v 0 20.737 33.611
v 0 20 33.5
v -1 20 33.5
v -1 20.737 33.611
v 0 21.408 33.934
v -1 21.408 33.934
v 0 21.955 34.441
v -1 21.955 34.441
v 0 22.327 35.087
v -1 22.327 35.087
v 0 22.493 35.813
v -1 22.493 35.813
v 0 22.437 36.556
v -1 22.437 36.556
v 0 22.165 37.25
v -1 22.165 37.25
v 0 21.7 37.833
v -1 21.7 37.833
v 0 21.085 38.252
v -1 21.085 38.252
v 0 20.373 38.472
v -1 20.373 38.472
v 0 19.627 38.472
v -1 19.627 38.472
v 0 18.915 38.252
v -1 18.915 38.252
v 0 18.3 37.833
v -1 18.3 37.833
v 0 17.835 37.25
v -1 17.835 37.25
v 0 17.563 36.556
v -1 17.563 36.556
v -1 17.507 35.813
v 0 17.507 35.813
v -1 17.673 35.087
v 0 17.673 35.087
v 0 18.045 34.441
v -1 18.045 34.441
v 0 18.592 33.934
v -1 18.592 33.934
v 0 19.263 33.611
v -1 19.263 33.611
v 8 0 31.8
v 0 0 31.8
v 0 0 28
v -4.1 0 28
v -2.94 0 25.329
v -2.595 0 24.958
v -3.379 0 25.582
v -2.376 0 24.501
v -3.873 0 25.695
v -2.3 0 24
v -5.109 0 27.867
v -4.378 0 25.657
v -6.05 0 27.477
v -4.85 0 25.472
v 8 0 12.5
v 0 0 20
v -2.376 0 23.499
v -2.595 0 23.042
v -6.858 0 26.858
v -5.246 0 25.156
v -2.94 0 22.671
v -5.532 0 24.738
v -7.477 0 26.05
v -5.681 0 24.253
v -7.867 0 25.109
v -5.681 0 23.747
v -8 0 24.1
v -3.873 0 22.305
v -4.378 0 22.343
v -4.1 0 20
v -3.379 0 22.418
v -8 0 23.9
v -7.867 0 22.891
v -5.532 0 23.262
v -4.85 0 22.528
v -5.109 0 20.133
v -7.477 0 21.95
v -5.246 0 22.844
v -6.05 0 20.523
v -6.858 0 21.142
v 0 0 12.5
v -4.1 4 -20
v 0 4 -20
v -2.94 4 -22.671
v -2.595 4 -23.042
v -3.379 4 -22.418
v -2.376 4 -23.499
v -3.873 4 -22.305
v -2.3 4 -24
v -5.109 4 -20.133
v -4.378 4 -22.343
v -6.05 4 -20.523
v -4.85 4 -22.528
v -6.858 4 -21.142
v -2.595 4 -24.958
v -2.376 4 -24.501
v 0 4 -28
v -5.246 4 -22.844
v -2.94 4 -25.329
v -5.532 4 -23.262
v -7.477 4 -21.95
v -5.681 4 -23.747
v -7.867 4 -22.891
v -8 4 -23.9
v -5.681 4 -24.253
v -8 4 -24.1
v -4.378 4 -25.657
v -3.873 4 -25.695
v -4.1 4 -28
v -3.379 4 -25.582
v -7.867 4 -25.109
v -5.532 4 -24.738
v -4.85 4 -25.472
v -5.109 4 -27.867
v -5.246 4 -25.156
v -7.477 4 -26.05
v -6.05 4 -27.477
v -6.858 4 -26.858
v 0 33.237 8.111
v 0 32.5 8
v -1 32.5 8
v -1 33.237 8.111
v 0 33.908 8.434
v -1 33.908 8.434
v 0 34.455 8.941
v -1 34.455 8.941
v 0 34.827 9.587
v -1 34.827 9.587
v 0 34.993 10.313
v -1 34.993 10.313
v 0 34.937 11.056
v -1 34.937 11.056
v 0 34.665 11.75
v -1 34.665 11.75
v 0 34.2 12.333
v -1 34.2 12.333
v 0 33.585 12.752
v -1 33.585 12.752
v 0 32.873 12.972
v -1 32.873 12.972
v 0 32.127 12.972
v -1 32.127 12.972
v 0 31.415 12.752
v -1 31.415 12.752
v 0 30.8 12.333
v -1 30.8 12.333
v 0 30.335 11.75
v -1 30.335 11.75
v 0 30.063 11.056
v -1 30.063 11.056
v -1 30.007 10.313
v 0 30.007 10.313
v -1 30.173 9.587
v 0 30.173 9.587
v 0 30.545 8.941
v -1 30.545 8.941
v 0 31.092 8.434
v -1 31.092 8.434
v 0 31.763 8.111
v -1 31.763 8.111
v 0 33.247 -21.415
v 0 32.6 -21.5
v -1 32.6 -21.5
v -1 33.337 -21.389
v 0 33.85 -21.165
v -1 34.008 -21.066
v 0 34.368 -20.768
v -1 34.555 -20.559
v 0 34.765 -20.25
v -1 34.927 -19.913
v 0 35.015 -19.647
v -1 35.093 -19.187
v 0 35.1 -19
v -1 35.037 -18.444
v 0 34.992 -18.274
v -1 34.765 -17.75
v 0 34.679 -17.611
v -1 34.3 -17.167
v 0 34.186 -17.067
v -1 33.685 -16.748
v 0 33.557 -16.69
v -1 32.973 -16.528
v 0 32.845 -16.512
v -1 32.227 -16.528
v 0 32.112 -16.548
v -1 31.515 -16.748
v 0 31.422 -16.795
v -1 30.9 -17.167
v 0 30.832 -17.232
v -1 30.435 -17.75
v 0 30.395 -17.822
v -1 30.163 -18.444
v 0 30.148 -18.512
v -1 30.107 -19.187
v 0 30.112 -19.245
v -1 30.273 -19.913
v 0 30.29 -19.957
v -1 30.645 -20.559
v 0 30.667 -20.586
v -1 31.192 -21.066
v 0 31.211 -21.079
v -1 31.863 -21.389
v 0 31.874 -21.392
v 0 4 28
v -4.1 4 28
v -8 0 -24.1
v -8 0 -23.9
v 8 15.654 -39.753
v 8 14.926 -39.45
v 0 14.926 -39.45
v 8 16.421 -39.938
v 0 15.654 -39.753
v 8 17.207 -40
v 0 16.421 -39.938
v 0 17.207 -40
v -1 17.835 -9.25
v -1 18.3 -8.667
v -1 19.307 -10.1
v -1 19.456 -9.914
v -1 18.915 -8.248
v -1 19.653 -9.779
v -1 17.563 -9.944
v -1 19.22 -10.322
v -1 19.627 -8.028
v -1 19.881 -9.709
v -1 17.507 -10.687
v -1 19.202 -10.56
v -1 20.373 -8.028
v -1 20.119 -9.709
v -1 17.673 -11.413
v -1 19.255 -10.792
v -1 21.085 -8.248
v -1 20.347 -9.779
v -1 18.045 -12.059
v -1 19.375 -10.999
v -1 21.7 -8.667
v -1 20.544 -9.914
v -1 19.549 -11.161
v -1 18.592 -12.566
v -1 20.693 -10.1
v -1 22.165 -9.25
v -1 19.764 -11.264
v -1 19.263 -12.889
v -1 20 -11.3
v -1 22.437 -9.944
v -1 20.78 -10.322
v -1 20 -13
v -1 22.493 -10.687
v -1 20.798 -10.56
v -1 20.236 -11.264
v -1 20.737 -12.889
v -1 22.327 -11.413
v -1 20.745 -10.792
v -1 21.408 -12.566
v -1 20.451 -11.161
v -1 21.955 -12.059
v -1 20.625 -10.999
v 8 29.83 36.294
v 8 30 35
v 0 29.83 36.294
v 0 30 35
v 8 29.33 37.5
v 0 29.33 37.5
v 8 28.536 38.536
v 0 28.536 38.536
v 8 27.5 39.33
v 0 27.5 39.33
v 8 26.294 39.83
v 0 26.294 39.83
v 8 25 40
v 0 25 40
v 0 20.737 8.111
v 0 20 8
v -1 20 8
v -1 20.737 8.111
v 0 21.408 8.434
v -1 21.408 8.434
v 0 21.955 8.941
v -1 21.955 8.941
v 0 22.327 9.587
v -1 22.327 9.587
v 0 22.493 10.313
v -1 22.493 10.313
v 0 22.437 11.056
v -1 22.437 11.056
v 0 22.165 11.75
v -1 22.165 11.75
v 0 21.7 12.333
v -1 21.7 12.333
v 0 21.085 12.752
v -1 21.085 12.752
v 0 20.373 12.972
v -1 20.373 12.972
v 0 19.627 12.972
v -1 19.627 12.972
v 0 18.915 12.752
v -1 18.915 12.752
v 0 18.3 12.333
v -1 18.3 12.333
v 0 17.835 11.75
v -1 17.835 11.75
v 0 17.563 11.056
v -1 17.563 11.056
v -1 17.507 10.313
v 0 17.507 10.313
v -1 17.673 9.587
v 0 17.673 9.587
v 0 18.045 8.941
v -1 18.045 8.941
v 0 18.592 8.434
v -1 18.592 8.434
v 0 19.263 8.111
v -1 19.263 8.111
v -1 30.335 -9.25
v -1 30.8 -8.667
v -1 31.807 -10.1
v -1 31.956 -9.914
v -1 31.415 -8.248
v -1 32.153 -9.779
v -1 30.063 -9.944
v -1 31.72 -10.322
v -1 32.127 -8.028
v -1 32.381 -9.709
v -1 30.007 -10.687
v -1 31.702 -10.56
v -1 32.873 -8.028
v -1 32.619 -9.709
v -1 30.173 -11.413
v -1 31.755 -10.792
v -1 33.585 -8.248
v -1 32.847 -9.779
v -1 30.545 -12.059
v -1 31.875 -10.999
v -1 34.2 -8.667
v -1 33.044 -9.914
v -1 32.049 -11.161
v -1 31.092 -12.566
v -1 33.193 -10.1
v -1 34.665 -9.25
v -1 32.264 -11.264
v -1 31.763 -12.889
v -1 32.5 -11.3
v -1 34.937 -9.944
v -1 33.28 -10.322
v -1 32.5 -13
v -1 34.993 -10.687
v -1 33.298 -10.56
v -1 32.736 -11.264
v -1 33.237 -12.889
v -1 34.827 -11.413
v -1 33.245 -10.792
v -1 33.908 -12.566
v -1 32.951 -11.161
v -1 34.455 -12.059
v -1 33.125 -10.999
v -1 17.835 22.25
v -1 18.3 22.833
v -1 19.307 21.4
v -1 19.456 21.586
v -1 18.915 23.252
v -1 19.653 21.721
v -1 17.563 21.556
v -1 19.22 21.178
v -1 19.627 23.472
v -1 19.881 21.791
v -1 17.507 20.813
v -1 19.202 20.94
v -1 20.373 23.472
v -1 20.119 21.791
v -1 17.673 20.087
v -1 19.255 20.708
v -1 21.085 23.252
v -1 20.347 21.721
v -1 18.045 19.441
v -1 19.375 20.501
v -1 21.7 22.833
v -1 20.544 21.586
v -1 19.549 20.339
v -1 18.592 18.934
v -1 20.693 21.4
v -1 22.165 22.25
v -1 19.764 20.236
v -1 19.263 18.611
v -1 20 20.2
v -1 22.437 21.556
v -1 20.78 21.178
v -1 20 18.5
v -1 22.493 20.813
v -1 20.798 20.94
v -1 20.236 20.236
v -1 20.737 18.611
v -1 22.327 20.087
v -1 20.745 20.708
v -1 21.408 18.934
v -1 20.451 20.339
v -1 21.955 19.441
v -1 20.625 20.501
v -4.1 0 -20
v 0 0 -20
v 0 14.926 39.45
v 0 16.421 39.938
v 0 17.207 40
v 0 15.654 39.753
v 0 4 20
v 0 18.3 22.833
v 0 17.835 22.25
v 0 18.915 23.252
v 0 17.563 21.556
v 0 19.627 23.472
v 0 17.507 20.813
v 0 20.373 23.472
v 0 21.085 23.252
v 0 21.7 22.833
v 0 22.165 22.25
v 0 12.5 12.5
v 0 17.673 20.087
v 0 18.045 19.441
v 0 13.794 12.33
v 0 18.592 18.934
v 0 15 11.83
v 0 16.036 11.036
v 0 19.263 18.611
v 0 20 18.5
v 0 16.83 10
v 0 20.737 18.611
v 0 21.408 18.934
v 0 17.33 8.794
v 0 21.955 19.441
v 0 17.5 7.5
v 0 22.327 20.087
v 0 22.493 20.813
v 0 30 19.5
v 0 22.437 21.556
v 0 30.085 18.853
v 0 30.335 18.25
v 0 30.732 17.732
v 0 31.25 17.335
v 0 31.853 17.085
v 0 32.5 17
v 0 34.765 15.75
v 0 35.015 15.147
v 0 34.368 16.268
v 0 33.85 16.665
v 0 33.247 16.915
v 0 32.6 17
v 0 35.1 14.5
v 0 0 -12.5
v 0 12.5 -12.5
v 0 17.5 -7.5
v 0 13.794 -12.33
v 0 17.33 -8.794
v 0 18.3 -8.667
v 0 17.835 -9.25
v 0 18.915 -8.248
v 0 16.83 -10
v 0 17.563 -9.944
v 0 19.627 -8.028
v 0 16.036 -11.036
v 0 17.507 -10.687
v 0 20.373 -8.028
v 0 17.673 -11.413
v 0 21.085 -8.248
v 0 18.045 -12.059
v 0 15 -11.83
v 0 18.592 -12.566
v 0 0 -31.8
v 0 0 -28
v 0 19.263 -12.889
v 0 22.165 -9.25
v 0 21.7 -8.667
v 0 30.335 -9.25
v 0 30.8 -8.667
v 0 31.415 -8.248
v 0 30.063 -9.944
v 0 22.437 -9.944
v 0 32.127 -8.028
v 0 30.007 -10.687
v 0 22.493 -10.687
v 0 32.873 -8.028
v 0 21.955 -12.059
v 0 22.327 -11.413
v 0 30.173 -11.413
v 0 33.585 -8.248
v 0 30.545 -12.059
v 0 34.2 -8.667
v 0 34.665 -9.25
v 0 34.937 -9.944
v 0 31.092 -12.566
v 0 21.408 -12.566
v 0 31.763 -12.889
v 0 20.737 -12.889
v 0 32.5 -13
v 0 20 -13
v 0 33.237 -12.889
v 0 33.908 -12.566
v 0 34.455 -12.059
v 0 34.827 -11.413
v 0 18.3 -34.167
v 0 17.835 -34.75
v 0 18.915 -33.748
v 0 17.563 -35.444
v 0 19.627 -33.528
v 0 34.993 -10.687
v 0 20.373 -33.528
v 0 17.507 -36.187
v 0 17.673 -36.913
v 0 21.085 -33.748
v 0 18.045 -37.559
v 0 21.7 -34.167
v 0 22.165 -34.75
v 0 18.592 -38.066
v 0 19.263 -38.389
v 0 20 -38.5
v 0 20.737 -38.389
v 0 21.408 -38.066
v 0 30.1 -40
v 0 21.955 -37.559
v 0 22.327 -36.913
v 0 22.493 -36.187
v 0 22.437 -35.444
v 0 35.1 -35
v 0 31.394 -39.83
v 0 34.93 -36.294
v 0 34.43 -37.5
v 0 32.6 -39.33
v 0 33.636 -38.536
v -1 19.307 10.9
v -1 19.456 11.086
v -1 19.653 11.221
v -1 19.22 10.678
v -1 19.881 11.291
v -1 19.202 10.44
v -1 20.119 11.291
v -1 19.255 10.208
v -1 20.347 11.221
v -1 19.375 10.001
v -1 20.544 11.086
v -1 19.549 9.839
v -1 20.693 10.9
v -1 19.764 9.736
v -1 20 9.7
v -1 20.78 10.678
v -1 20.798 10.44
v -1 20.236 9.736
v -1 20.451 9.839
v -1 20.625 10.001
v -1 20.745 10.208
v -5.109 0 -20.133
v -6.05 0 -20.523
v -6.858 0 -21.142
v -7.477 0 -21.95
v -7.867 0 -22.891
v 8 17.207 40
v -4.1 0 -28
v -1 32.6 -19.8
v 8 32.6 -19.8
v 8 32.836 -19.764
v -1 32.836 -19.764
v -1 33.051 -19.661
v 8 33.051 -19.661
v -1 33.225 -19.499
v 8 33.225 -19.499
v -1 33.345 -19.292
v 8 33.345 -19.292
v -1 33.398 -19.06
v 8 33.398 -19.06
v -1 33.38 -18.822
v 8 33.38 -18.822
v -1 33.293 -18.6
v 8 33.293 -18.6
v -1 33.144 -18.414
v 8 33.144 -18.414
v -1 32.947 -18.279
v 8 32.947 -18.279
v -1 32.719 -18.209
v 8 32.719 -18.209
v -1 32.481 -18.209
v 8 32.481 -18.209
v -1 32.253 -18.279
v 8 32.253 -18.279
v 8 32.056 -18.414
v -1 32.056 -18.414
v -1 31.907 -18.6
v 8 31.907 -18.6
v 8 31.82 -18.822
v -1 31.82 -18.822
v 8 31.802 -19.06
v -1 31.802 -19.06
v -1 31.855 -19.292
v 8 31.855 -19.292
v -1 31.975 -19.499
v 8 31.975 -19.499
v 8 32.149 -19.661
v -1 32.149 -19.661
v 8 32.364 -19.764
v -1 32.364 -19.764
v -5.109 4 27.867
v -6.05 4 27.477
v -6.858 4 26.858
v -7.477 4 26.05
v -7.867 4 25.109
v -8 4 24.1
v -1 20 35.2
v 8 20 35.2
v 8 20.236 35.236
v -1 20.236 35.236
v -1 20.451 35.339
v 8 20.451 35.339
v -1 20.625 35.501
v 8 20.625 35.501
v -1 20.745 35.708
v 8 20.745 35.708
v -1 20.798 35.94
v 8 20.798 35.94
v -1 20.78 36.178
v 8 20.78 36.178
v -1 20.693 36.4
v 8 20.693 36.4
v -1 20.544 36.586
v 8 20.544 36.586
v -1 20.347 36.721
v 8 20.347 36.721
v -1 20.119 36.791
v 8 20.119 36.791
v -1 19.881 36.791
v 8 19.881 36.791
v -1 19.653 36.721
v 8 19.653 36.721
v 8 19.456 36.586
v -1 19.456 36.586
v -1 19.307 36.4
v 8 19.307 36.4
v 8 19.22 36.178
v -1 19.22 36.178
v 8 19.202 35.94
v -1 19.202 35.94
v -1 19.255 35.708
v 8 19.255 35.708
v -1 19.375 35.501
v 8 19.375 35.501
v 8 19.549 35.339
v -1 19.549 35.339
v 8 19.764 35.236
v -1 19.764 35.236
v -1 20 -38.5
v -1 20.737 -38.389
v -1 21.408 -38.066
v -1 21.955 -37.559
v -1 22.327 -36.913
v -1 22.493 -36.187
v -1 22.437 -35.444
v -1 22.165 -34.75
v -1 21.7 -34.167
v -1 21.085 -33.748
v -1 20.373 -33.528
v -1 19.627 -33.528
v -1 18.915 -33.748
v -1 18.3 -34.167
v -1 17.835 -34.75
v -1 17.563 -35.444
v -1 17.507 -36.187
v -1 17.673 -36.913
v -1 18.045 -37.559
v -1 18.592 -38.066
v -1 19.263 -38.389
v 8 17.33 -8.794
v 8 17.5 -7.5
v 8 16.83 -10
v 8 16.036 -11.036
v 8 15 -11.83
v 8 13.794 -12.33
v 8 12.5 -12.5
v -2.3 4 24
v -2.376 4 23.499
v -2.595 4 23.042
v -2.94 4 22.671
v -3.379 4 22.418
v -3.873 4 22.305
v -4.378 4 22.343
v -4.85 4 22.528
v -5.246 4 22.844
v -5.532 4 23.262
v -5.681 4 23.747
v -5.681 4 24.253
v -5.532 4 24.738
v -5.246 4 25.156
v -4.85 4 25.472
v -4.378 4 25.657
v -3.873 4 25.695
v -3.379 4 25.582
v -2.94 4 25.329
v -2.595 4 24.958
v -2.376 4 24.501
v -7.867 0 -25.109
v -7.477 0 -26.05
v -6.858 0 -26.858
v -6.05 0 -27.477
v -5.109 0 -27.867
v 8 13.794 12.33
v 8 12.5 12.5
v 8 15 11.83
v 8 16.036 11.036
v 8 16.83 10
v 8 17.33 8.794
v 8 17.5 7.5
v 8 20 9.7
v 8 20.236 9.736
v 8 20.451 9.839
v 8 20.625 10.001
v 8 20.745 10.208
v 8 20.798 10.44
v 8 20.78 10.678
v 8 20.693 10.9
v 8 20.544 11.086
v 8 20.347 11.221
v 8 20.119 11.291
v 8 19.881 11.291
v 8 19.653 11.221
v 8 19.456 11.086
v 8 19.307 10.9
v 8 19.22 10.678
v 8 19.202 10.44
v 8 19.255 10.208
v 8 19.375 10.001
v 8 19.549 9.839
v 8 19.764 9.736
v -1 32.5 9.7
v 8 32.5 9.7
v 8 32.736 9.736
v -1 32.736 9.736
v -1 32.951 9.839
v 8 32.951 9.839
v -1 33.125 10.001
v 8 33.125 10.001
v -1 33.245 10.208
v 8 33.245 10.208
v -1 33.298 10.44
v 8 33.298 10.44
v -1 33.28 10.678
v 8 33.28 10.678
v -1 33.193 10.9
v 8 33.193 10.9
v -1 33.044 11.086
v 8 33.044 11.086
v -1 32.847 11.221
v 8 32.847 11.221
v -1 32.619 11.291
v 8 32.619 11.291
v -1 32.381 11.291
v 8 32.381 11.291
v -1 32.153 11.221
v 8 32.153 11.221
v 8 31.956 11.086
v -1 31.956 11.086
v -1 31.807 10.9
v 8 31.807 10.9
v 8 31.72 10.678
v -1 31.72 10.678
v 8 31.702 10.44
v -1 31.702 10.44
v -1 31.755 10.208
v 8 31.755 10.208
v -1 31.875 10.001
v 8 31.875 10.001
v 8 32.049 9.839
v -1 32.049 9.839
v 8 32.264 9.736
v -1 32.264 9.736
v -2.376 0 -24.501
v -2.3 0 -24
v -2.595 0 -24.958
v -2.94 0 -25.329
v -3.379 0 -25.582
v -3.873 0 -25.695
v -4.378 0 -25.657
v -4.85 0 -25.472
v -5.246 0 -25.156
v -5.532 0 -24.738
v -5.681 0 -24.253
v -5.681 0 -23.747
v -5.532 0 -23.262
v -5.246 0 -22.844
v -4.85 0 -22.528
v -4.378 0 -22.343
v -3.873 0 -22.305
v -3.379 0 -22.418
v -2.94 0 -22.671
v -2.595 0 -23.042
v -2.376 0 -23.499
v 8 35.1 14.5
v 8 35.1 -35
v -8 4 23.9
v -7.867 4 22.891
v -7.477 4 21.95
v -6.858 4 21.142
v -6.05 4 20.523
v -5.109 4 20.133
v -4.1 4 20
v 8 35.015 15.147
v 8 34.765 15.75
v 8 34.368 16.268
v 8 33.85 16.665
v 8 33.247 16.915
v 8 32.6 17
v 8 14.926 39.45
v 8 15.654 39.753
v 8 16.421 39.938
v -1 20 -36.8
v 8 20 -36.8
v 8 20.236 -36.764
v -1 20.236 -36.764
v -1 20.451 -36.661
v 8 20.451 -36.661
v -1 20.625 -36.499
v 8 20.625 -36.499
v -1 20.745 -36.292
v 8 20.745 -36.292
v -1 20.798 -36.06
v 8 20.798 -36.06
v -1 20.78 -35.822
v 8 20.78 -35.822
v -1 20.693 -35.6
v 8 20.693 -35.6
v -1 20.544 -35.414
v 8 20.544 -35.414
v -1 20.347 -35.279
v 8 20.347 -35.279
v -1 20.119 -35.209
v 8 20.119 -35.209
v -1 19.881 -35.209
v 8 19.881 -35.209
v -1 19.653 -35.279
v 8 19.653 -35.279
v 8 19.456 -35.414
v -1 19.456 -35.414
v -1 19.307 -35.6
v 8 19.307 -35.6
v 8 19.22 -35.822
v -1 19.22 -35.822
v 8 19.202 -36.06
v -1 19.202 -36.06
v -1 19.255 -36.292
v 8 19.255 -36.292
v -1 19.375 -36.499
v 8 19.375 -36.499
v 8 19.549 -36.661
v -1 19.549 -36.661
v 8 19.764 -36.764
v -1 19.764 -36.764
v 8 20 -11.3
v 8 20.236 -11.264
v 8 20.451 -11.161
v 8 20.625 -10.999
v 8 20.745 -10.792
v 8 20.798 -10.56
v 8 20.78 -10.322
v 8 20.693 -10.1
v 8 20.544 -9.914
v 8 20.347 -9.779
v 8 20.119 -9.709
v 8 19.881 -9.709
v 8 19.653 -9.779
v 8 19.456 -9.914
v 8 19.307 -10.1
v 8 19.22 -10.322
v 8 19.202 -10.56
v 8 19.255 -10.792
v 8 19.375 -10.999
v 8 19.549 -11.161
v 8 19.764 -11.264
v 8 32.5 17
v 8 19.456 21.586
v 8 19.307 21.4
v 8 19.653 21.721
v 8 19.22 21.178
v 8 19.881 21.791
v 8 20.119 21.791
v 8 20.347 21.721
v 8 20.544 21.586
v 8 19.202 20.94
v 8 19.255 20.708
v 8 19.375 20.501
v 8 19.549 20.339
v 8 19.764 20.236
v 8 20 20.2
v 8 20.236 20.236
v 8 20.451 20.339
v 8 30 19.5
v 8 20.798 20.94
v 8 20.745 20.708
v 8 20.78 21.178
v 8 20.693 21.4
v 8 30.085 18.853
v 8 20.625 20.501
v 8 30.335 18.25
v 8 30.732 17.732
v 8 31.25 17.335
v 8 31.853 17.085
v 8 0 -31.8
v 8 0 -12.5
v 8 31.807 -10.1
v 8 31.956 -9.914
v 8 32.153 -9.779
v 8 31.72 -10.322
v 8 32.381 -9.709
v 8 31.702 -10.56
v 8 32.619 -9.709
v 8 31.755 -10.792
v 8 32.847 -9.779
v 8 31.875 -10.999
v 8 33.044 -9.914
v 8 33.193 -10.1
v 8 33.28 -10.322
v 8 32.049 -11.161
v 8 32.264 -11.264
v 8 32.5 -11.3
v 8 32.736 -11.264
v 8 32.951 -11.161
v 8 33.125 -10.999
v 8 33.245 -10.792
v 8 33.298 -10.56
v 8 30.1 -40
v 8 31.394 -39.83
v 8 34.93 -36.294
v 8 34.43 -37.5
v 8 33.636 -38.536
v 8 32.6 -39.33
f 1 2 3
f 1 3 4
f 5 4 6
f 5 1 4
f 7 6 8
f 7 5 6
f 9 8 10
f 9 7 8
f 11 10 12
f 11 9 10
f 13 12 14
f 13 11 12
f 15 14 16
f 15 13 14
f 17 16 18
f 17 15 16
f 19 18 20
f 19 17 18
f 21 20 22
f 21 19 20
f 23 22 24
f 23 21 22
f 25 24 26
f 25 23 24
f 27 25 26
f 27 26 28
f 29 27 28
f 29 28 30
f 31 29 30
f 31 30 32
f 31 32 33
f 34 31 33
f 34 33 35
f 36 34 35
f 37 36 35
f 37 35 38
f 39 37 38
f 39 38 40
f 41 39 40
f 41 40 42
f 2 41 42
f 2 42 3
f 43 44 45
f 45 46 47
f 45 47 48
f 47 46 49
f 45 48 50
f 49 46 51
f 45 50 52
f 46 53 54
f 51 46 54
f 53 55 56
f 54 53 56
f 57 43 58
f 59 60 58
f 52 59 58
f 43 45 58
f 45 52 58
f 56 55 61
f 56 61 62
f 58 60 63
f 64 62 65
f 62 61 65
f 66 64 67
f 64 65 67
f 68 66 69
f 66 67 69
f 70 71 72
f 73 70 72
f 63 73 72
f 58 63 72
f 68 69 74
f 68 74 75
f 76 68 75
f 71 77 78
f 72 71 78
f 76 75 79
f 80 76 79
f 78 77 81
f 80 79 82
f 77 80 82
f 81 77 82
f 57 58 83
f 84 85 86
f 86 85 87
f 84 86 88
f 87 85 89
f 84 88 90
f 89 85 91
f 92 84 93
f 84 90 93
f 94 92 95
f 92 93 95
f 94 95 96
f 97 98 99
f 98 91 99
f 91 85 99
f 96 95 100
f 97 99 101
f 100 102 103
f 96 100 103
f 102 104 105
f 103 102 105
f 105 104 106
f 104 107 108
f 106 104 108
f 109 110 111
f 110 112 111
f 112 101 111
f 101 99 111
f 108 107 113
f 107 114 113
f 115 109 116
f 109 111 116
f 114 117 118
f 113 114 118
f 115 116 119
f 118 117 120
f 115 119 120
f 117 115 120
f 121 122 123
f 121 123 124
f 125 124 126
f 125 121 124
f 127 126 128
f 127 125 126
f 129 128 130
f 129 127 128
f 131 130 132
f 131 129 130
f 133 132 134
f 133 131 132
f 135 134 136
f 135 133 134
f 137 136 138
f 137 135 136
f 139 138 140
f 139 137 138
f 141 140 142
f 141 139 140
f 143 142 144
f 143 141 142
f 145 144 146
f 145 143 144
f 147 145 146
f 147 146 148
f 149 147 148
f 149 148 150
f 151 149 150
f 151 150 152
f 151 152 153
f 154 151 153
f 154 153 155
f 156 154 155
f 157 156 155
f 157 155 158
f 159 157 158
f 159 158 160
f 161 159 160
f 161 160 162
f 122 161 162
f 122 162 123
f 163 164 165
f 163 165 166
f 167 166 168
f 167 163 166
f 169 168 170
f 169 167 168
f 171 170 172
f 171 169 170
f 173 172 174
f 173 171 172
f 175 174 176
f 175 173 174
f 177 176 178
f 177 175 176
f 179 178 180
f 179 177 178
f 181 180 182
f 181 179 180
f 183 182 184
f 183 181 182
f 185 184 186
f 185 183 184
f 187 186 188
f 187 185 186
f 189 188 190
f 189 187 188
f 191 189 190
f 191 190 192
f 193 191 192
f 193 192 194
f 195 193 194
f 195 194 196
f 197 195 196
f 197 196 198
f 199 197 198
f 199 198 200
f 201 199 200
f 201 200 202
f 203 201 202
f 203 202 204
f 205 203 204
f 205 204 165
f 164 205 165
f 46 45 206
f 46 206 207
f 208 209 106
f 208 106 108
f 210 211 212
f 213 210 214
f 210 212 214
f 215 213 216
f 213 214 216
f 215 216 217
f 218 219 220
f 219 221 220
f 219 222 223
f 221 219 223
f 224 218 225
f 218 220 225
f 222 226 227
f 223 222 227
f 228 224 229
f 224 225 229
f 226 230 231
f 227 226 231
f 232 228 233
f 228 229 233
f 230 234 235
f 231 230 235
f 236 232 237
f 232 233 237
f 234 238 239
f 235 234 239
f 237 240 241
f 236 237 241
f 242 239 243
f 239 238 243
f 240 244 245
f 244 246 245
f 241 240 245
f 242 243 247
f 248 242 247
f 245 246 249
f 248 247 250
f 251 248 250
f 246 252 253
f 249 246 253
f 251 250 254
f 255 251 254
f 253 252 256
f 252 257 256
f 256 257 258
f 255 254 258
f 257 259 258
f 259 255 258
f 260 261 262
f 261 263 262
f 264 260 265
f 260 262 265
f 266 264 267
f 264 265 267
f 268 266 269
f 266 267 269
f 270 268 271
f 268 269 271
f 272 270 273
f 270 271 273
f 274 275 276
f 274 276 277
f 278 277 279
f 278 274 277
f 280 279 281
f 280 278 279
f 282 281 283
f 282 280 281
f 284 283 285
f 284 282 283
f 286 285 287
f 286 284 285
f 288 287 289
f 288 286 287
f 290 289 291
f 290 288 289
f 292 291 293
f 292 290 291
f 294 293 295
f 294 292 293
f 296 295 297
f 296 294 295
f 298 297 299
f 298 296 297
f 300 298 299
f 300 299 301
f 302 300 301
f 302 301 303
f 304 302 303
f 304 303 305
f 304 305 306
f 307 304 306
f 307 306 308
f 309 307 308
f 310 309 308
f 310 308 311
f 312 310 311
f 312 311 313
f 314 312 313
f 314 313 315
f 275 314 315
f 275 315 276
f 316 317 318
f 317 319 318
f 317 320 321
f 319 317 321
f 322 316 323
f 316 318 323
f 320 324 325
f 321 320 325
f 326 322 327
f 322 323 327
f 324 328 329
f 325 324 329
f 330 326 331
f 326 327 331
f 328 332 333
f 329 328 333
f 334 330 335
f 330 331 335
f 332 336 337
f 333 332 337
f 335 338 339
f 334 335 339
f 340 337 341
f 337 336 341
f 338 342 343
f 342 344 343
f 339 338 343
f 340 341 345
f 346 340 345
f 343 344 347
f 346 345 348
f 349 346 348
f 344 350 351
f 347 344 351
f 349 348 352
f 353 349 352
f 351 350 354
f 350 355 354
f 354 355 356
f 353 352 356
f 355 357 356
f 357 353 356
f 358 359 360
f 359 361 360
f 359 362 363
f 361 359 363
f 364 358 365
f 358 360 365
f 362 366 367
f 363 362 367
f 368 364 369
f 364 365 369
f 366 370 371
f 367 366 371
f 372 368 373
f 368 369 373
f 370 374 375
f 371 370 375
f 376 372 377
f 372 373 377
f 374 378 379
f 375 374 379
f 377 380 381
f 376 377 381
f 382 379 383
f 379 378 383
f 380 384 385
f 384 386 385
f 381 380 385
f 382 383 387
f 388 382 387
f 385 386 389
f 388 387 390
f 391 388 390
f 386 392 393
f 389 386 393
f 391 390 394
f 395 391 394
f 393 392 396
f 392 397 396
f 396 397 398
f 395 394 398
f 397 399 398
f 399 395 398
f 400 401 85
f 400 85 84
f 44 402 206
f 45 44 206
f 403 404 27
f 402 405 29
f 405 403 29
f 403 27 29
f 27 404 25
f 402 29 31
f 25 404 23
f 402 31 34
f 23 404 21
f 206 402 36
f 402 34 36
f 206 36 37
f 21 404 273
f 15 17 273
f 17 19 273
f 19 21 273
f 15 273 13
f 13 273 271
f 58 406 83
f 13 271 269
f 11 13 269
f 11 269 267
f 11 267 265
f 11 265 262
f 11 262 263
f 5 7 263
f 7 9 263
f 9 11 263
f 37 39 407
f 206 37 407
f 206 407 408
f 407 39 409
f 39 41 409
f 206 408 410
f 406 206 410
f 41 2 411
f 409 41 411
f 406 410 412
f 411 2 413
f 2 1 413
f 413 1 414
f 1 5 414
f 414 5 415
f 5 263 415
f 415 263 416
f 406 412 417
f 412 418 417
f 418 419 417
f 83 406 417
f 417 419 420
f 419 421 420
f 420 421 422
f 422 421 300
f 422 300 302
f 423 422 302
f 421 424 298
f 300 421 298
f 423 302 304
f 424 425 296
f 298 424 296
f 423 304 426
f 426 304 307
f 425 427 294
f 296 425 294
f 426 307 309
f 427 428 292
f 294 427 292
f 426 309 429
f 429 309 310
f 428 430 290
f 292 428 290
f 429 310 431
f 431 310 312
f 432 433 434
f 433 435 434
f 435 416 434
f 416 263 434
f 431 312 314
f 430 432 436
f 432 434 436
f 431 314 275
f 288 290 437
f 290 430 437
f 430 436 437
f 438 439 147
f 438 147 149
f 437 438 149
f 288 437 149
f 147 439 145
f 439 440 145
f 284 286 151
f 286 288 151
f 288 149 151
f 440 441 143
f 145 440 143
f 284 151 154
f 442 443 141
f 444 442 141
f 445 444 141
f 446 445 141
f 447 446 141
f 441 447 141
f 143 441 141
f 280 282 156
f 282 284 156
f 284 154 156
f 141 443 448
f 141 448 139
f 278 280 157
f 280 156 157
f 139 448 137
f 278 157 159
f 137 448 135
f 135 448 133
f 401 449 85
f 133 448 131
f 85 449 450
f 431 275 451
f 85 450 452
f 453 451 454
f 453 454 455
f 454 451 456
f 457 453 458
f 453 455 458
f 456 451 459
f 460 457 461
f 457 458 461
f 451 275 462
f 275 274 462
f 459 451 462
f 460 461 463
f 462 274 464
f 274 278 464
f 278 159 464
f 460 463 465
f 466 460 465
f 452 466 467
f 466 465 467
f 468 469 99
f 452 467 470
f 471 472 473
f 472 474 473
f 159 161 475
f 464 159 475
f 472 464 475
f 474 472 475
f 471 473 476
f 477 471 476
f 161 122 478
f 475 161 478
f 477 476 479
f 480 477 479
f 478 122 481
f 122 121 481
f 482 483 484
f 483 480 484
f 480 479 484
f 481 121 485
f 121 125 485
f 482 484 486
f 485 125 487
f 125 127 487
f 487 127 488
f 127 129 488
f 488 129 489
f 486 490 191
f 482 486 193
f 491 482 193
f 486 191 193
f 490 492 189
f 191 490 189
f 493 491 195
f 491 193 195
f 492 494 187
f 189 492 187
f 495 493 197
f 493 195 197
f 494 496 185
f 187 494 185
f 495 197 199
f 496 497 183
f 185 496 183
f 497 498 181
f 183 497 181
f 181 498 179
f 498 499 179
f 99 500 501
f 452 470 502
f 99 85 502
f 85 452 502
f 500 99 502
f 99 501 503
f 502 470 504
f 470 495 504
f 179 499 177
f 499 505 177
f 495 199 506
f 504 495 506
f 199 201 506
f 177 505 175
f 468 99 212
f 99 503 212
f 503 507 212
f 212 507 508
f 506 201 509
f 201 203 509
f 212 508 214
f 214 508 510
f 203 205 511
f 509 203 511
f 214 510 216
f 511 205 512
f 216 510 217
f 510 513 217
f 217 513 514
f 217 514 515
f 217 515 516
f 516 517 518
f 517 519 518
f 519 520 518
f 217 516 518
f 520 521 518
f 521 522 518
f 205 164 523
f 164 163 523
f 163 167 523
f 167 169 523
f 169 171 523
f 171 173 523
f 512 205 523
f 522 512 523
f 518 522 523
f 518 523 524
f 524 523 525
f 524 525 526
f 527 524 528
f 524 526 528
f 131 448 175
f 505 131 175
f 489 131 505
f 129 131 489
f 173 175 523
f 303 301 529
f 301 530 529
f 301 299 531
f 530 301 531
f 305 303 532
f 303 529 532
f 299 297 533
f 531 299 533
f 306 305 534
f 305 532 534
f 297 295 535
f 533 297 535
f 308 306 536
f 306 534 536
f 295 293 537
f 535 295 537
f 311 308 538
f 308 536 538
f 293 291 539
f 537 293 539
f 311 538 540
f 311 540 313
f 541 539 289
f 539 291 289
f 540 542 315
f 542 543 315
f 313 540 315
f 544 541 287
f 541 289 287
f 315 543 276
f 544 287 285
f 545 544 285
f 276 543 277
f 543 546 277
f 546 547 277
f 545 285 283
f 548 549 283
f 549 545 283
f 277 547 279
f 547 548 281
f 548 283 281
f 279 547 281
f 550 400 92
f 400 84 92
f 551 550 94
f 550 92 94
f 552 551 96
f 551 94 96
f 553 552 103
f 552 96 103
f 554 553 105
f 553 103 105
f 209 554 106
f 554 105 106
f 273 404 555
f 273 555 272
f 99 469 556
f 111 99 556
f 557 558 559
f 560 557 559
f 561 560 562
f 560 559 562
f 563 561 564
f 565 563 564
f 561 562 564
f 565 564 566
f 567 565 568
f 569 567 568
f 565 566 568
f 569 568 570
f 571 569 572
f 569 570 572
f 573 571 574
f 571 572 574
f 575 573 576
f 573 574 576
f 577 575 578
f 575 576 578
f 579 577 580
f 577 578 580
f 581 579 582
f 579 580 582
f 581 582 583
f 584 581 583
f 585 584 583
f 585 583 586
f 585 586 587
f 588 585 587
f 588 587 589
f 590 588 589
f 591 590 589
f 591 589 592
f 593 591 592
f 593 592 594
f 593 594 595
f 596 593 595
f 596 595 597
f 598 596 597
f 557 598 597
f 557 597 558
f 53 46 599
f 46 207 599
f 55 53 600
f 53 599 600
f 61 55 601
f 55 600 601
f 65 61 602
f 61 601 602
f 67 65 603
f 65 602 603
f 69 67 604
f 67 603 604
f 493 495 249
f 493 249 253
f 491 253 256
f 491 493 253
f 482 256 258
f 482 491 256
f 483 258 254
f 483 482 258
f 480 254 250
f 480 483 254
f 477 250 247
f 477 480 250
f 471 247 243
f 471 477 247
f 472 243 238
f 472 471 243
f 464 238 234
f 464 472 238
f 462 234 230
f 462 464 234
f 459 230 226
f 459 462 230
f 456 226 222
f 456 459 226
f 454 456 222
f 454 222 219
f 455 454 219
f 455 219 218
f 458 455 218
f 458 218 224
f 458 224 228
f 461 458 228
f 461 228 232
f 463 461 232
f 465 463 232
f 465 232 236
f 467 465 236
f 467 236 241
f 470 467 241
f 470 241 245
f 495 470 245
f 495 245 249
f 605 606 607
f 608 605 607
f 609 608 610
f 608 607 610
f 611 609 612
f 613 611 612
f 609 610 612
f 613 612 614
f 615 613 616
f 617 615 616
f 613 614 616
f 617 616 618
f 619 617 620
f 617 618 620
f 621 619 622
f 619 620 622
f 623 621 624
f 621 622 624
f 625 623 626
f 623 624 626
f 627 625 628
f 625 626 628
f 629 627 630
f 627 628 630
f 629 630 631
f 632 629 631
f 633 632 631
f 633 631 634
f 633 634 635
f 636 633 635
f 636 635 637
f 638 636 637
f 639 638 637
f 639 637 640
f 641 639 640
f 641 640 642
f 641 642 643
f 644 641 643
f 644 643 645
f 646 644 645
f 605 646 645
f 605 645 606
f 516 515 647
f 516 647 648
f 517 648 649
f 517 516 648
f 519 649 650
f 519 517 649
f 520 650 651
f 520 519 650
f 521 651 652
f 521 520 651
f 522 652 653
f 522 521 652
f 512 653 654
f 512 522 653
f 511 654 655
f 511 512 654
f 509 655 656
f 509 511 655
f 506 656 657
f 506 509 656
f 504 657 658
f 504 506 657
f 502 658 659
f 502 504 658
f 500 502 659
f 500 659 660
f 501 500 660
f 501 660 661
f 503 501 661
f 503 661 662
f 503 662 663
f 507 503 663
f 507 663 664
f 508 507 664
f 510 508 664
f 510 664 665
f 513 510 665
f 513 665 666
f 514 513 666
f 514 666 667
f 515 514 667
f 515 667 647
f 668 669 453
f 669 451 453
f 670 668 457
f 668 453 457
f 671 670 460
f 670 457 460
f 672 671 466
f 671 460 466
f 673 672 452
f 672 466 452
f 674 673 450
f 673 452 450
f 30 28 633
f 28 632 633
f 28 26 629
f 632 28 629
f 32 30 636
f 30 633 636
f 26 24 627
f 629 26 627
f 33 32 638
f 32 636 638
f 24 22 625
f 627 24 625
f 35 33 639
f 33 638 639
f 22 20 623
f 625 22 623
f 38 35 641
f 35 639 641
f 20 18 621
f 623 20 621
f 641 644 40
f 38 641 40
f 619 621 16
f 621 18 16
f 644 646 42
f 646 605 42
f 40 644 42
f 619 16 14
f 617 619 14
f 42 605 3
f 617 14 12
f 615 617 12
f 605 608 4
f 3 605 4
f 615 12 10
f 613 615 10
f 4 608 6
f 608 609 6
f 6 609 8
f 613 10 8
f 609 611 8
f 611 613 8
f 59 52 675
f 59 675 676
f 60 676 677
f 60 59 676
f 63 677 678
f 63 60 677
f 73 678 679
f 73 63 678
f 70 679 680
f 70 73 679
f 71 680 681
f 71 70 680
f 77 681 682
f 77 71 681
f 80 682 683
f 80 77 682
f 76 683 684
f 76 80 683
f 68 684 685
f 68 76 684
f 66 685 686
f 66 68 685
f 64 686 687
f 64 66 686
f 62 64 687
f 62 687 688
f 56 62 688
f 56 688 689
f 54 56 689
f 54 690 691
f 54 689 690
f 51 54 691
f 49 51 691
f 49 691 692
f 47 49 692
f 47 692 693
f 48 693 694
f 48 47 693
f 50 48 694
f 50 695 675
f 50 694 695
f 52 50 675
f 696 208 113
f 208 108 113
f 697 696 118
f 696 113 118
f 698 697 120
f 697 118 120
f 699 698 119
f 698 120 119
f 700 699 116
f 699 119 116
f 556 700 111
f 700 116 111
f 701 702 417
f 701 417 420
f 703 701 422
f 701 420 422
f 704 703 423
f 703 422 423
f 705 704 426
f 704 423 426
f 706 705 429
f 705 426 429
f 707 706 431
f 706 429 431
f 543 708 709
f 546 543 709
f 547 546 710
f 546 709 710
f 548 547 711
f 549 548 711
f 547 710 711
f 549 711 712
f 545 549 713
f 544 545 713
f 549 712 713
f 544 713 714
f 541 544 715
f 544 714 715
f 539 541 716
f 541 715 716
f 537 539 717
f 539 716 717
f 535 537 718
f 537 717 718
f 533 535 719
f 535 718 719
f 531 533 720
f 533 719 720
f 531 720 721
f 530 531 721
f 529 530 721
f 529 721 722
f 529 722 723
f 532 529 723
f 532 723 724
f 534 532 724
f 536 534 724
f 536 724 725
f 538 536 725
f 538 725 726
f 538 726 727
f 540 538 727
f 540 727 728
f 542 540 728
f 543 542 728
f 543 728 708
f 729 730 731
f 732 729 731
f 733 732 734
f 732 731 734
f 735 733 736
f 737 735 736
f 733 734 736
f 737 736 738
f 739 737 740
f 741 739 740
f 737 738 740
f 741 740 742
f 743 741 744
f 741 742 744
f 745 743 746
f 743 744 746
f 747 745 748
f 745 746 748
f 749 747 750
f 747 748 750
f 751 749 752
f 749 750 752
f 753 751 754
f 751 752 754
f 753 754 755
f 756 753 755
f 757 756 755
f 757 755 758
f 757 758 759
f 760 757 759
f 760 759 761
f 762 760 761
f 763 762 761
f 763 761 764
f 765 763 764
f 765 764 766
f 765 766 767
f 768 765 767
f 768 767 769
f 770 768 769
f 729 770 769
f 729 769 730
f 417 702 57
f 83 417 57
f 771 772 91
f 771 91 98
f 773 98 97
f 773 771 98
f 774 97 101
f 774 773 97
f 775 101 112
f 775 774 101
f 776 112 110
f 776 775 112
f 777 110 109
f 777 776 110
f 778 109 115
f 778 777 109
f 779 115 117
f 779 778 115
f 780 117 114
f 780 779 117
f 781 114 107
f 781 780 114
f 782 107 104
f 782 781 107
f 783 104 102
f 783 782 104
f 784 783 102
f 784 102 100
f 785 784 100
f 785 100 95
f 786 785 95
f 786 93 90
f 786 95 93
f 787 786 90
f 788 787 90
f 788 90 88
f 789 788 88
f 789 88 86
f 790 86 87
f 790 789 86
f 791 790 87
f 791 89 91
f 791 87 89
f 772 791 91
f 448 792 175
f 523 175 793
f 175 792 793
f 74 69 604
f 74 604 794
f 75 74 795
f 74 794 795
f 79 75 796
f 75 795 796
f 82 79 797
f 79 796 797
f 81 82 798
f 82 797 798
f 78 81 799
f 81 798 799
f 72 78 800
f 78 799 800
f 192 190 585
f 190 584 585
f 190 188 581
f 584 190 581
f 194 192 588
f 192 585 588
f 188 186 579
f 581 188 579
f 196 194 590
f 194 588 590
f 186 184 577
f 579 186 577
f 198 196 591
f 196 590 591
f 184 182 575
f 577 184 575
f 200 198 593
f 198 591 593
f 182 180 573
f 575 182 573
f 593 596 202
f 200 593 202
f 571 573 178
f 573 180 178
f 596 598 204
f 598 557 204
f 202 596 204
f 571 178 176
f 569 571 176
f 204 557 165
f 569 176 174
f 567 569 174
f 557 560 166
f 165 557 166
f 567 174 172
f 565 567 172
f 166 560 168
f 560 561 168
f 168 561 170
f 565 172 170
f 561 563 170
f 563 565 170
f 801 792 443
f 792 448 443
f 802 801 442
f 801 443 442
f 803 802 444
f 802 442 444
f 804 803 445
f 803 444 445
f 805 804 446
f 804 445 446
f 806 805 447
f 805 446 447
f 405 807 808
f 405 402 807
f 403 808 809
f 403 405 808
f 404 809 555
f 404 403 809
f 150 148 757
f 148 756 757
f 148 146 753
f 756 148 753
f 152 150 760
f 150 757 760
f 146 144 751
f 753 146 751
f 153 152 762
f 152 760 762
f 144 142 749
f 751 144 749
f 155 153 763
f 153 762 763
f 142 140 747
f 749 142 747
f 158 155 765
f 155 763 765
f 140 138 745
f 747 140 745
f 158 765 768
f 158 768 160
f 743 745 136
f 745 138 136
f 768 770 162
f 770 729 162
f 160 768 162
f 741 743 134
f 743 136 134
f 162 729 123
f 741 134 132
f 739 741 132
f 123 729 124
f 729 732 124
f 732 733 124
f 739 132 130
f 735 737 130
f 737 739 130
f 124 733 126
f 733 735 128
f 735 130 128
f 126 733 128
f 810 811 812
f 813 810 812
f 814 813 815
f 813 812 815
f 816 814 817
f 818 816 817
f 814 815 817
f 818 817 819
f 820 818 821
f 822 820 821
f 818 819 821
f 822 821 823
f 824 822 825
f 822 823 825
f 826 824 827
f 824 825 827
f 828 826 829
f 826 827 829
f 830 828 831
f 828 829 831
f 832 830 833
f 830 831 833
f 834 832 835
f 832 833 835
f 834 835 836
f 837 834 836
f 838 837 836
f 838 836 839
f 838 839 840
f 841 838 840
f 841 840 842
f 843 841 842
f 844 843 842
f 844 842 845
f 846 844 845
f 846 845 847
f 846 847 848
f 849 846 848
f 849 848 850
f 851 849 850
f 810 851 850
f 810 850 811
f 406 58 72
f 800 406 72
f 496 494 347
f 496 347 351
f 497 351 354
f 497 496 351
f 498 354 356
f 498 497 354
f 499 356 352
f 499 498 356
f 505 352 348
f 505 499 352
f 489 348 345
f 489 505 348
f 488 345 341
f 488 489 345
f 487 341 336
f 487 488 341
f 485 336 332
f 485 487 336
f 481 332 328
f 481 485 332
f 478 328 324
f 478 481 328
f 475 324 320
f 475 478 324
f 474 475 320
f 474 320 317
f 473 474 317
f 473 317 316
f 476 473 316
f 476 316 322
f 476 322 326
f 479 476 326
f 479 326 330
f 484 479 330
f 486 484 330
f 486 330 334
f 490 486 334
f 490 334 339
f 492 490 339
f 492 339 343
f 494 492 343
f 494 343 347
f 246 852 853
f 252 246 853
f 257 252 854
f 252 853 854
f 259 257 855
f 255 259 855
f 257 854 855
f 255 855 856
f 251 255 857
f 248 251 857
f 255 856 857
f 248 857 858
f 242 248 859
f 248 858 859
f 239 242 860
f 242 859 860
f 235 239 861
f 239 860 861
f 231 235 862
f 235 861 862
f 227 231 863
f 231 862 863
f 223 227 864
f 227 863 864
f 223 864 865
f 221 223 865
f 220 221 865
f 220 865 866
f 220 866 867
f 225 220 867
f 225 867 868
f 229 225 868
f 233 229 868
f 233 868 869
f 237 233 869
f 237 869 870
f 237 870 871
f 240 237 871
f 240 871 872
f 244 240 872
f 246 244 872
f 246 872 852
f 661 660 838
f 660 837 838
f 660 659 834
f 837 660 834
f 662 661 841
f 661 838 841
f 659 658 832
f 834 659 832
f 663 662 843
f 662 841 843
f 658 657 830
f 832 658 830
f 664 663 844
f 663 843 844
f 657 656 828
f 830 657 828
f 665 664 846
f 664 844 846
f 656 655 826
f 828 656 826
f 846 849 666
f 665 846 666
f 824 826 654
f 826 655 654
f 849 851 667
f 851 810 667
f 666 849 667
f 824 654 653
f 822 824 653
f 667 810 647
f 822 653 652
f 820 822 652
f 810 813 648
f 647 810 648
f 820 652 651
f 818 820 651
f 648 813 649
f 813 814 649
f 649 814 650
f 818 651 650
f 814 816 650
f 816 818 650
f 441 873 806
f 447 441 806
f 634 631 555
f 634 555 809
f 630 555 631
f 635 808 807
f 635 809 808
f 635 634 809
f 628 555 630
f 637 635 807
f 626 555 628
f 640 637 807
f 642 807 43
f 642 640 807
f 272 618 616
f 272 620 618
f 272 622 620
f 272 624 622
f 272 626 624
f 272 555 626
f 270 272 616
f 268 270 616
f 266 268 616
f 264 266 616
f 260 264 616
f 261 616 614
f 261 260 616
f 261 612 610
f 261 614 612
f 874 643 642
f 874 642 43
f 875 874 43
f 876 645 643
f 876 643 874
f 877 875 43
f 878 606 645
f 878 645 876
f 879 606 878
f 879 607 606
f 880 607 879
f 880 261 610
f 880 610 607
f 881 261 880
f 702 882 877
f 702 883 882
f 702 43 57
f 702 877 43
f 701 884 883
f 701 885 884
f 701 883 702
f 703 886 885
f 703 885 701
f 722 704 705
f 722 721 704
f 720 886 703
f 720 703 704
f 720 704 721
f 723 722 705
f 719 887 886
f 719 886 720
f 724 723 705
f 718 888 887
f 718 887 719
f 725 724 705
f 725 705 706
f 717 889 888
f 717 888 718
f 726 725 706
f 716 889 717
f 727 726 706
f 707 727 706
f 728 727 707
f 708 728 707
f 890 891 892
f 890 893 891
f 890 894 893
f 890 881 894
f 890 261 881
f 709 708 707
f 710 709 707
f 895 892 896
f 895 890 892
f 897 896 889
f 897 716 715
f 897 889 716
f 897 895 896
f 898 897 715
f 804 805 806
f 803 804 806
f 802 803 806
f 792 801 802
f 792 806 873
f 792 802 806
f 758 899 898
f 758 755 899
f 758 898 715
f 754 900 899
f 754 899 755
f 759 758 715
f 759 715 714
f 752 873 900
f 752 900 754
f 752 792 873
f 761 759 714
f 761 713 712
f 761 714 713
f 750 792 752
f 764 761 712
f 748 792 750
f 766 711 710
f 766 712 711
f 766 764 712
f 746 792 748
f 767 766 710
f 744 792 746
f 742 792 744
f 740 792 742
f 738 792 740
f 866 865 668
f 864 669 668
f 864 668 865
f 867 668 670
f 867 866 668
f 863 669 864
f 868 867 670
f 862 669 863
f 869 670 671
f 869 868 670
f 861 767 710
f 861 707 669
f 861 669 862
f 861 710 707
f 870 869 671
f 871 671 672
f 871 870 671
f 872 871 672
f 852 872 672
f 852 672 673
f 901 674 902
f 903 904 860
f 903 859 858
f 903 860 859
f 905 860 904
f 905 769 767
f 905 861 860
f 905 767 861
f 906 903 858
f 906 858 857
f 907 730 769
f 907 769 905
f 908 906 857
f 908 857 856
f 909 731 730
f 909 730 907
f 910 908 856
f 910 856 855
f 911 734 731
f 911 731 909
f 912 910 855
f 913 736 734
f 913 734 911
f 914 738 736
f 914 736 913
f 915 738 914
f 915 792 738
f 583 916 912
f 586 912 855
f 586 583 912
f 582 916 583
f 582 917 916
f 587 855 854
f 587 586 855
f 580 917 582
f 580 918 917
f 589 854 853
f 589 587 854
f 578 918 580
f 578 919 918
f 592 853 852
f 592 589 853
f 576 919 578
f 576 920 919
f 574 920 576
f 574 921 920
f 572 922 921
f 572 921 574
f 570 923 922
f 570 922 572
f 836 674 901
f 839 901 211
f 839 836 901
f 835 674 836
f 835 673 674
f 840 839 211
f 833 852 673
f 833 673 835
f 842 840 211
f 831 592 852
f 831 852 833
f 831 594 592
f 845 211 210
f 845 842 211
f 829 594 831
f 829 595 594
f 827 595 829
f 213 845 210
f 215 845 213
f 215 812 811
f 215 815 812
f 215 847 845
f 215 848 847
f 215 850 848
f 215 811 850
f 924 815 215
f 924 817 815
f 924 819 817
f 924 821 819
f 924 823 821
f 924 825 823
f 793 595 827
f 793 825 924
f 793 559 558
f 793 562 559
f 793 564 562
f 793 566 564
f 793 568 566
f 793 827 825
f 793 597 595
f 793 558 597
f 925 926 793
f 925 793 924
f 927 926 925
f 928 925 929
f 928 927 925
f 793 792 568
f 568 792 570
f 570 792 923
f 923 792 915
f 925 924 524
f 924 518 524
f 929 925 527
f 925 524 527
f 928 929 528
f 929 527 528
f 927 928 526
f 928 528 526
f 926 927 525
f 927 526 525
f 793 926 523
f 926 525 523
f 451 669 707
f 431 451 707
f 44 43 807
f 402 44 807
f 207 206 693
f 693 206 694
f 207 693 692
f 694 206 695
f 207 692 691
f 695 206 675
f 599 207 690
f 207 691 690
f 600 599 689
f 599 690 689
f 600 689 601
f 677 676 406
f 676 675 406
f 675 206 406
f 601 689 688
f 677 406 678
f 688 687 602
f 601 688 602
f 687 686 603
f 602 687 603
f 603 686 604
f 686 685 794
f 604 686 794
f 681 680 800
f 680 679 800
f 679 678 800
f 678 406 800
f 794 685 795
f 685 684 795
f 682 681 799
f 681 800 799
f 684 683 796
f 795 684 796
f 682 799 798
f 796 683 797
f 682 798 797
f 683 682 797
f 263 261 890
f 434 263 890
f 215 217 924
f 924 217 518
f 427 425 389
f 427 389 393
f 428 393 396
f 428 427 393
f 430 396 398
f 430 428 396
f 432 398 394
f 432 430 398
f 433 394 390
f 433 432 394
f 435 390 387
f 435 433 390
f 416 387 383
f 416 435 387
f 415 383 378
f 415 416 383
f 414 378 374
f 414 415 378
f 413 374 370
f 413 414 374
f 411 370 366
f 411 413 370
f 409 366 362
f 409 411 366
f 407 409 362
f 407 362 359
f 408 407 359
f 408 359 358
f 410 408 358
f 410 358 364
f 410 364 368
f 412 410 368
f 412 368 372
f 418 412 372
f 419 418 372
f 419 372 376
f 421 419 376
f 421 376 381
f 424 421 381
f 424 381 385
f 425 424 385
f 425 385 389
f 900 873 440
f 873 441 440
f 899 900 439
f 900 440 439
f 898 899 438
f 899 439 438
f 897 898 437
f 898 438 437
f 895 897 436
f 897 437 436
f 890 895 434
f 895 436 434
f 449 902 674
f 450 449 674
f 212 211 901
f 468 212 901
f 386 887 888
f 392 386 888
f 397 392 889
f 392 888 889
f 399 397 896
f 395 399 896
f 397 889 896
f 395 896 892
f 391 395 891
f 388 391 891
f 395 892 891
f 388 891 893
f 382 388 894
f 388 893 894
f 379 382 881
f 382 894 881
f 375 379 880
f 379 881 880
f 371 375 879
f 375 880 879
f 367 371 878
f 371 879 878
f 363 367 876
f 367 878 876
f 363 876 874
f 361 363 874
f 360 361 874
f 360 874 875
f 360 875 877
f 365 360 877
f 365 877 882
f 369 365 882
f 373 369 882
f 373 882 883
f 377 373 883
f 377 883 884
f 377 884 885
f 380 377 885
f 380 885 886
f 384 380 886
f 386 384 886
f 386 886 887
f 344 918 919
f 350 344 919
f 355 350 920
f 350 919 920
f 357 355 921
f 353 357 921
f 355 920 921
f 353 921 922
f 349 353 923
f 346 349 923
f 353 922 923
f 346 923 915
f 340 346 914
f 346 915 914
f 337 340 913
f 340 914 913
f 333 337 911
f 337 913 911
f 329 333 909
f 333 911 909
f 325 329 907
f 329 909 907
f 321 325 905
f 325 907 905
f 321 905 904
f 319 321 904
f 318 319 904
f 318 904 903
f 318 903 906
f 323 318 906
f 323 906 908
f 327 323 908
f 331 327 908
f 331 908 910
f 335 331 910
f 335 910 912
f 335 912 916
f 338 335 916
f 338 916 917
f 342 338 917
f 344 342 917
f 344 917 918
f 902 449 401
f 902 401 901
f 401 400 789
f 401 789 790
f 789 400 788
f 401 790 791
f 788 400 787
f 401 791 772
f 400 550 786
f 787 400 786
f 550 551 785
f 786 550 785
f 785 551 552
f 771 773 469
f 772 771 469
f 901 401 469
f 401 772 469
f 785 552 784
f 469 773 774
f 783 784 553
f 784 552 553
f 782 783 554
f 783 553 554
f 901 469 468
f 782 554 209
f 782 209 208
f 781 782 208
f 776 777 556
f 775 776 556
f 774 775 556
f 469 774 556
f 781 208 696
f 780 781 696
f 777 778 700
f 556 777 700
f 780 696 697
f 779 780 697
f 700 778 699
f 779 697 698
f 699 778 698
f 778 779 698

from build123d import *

# Parameters (mm, degrees)
SKETCH2_W             = 80
SKETCH2_H             = 40
BOSS_EXTRUDE1_DEPTH   = 8
SKETCH3_R             = 2.5
BOSS_EXTRUDE2_DEPTH   = 9
SKETCH4_R             = 2.5
BOSS_EXTRUDE3_DEPTH   = 9
SKETCH5_R             = 2.5
BOSS_EXTRUDE4_DEPTH   = 9
CUT_EXTRUDE1_DEPTH    = 10
FILLET5_R             = 5
FILLET6_R             = 2.5
SKETCH8_W             = 8
SKETCH8_H             = 8
BOSS_EXTRUDE5_DEPTH   = 4
FILLET7_R             = 3.9
M3_CLEARANCE_HOLE1_D  = 3.4
M2X0_4_TAPPED_HOLE1_D = 1.6
FILLET7_OF_MIRROR1_R  = 3.9
SKETCH13_W            = 18.895911776
SKETCH13_H            = 64.667980446
CUT_EXTRUDE2_DEPTH    = 10


with BuildPart() as part:
    # Sketch2 → Boss-Extrude1 (new body)
    with BuildSketch(Plane(origin=(0, 0, 0), x_dir=(0, 0, -1), z_dir=(1, 0, 0))):
        with Locations((0, 20)):
            Rectangle(SKETCH2_W, SKETCH2_H)
    extrude(amount=BOSS_EXTRUDE1_DEPTH)

    # Sketch3 → Boss-Extrude2 (add)
    with BuildSketch(Plane(origin=(8, 0, 0), x_dir=(0, 0, -1), z_dir=(1, 0, 0))):
        with Locations((-36, 20)):
            Circle(SKETCH3_R)
        with Locations((-21, 20)):
            Circle(SKETCH3_R)
    extrude(amount=-BOSS_EXTRUDE2_DEPTH)

    # Sketch4 → Boss-Extrude3 (add)
    with BuildSketch(Plane(origin=(8, 0, 0), x_dir=(0, 0, -1), z_dir=(1, 0, 0))):
        with Locations((36, 20)):
            Circle(SKETCH4_R)
        with Locations((19, 32.6)):
            Circle(SKETCH4_R)
    extrude(amount=-BOSS_EXTRUDE3_DEPTH)

    # Sketch5 → Boss-Extrude4 (add)
    with BuildSketch(Plane(origin=(8, 0, 0), x_dir=(0, 0, -1), z_dir=(1, 0, 0))):
        with Locations((-10.5, 20)):
            Circle(SKETCH5_R)
        with Locations((10.5, 20)):
            Circle(SKETCH5_R)
        with Locations((10.5, 32.5)):
            Circle(SKETCH5_R)
        with Locations((-10.5, 32.5)):
            Circle(SKETCH5_R)
    extrude(amount=-BOSS_EXTRUDE4_DEPTH)

    # Sketch7 → Cut-Extrude1 (cut, through all)
    with BuildSketch(Plane(origin=(8, 0, 0), x_dir=(0, 0, -1), z_dir=(1, 0, 0))):
        Polygon((-31.8, 0), (-40, 16), (-47.08718472, 13.485117516), (-40, -21.908315756), (60.433184959, -20.412978779), (53.645426669, 13.485117516), (40, 16), (31.8, 0), (12.5, 0), (12.5, 17.5), (-12.5, 17.5), (-12.5, 0), align=None)
        Polygon((-40, 30), (-17, 30), (-17, 35.1), (40, 35.1), (58.962780813, 50.466125935), (-17, 44.25101618), (-17, 56.378048051), (-45.880127829, 54.443581987), align=None)
    extrude(amount=-CUT_EXTRUDE1_DEPTH, mode=Mode.SUBTRACT)

    # Fillet5
    fillet5_edges = [part.edges().sort_by_distance(p)[0] for p in [
        (4, 30, 40),
        (4, 35.1, -40),
        (4, 17.5, 12.5),
        (4, 17.5, -12.5),
        (4, 16, -40),
        (4, 16, 40),
    ]]
    fillet(fillet5_edges, radius=FILLET5_R)

    # Fillet6
    fillet6_edges = [part.edges().sort_by_distance(p)[0] for p in [
        (4, 35.1, 17),
        (4, 30, 17),
    ]]
    fillet(fillet6_edges, radius=FILLET6_R)

    # Sketch8 → Boss-Extrude5 (add)
    with BuildSketch(Plane(origin=(0, 0, 0), x_dir=(1, 0, 0), z_dir=(0, 1, 0))):
        with Locations((12, -24)):
            Rectangle(SKETCH8_W, SKETCH8_H)
        with Locations((12, 24)):
            Rectangle(SKETCH8_W, SKETCH8_H)
    boss_extrude5 = extrude(amount=BOSS_EXTRUDE5_DEPTH)

    # Fillet7
    fillet7_edges = [part.edges().sort_by_distance(p)[0] for p in [
        (16, 2, -20),
        (16, 2, -28),
        (16, 2, 28),
        (16, 2, 20),
    ]]
    fillet(fillet7_edges, radius=FILLET7_R)

    # M3 Clearance Hole1 (through all)
    with Locations(Plane(origin=(0, 4, 0), x_dir=(1, 0, 0), z_dir=(0, 1, 0))):
        with Locations((12, -24), (-4, -24), (-4, 24), (12, 24)):
            m3_clearance_hole1 = Hole(M3_CLEARANCE_HOLE1_D / 2)

    # M2x0.4 Tapped Hole1 (through all)
    with Locations(Plane.ZY.offset(1)):
        with Locations((-19, 32.6), (-36, 20), (-10.5, 32.5), (-10.5, 20), (10.5, 20), (10.5, 32.5), (21, 20), (36, 20)):
            Hole(M2X0_4_TAPPED_HOLE1_D / 2)

    # Mirror1: Boss-Extrude5, M3 Clearance Hole1 across plane
    add(boss_extrude5.mirror(Plane(origin=(4, 0, 0), x_dir=(0, 0, 1), z_dir=(1, 0, 0))))
    add(m3_clearance_hole1.mirror(Plane(origin=(4, 0, 0), x_dir=(0, 0, 1), z_dir=(1, 0, 0))), mode=Mode.SUBTRACT)

    # Fillet7 of Mirror1
    fillet7_of_mirror1_edges = [part.edges().sort_by_distance(p)[0] for p in [
        (-8, 2, -20),
        (-8, 2, -28),
        (-8, 2, 28),
        (-8, 2, 20),
    ]]
    fillet(fillet7_of_mirror1_edges, radius=FILLET7_OF_MIRROR1_R)

    # Sketch13 → Cut-Extrude2 (cut)
    with BuildSketch(Plane(origin=(0, 0, 0), x_dir=(1, 0, 0), z_dir=(0, 1, 0))):
        with Locations((17.447955888, 0.533990223)):
            Rectangle(SKETCH13_W, SKETCH13_H)
    extrude(amount=CUT_EXTRUDE2_DEPTH, mode=Mode.SUBTRACT)


solid = part.part
